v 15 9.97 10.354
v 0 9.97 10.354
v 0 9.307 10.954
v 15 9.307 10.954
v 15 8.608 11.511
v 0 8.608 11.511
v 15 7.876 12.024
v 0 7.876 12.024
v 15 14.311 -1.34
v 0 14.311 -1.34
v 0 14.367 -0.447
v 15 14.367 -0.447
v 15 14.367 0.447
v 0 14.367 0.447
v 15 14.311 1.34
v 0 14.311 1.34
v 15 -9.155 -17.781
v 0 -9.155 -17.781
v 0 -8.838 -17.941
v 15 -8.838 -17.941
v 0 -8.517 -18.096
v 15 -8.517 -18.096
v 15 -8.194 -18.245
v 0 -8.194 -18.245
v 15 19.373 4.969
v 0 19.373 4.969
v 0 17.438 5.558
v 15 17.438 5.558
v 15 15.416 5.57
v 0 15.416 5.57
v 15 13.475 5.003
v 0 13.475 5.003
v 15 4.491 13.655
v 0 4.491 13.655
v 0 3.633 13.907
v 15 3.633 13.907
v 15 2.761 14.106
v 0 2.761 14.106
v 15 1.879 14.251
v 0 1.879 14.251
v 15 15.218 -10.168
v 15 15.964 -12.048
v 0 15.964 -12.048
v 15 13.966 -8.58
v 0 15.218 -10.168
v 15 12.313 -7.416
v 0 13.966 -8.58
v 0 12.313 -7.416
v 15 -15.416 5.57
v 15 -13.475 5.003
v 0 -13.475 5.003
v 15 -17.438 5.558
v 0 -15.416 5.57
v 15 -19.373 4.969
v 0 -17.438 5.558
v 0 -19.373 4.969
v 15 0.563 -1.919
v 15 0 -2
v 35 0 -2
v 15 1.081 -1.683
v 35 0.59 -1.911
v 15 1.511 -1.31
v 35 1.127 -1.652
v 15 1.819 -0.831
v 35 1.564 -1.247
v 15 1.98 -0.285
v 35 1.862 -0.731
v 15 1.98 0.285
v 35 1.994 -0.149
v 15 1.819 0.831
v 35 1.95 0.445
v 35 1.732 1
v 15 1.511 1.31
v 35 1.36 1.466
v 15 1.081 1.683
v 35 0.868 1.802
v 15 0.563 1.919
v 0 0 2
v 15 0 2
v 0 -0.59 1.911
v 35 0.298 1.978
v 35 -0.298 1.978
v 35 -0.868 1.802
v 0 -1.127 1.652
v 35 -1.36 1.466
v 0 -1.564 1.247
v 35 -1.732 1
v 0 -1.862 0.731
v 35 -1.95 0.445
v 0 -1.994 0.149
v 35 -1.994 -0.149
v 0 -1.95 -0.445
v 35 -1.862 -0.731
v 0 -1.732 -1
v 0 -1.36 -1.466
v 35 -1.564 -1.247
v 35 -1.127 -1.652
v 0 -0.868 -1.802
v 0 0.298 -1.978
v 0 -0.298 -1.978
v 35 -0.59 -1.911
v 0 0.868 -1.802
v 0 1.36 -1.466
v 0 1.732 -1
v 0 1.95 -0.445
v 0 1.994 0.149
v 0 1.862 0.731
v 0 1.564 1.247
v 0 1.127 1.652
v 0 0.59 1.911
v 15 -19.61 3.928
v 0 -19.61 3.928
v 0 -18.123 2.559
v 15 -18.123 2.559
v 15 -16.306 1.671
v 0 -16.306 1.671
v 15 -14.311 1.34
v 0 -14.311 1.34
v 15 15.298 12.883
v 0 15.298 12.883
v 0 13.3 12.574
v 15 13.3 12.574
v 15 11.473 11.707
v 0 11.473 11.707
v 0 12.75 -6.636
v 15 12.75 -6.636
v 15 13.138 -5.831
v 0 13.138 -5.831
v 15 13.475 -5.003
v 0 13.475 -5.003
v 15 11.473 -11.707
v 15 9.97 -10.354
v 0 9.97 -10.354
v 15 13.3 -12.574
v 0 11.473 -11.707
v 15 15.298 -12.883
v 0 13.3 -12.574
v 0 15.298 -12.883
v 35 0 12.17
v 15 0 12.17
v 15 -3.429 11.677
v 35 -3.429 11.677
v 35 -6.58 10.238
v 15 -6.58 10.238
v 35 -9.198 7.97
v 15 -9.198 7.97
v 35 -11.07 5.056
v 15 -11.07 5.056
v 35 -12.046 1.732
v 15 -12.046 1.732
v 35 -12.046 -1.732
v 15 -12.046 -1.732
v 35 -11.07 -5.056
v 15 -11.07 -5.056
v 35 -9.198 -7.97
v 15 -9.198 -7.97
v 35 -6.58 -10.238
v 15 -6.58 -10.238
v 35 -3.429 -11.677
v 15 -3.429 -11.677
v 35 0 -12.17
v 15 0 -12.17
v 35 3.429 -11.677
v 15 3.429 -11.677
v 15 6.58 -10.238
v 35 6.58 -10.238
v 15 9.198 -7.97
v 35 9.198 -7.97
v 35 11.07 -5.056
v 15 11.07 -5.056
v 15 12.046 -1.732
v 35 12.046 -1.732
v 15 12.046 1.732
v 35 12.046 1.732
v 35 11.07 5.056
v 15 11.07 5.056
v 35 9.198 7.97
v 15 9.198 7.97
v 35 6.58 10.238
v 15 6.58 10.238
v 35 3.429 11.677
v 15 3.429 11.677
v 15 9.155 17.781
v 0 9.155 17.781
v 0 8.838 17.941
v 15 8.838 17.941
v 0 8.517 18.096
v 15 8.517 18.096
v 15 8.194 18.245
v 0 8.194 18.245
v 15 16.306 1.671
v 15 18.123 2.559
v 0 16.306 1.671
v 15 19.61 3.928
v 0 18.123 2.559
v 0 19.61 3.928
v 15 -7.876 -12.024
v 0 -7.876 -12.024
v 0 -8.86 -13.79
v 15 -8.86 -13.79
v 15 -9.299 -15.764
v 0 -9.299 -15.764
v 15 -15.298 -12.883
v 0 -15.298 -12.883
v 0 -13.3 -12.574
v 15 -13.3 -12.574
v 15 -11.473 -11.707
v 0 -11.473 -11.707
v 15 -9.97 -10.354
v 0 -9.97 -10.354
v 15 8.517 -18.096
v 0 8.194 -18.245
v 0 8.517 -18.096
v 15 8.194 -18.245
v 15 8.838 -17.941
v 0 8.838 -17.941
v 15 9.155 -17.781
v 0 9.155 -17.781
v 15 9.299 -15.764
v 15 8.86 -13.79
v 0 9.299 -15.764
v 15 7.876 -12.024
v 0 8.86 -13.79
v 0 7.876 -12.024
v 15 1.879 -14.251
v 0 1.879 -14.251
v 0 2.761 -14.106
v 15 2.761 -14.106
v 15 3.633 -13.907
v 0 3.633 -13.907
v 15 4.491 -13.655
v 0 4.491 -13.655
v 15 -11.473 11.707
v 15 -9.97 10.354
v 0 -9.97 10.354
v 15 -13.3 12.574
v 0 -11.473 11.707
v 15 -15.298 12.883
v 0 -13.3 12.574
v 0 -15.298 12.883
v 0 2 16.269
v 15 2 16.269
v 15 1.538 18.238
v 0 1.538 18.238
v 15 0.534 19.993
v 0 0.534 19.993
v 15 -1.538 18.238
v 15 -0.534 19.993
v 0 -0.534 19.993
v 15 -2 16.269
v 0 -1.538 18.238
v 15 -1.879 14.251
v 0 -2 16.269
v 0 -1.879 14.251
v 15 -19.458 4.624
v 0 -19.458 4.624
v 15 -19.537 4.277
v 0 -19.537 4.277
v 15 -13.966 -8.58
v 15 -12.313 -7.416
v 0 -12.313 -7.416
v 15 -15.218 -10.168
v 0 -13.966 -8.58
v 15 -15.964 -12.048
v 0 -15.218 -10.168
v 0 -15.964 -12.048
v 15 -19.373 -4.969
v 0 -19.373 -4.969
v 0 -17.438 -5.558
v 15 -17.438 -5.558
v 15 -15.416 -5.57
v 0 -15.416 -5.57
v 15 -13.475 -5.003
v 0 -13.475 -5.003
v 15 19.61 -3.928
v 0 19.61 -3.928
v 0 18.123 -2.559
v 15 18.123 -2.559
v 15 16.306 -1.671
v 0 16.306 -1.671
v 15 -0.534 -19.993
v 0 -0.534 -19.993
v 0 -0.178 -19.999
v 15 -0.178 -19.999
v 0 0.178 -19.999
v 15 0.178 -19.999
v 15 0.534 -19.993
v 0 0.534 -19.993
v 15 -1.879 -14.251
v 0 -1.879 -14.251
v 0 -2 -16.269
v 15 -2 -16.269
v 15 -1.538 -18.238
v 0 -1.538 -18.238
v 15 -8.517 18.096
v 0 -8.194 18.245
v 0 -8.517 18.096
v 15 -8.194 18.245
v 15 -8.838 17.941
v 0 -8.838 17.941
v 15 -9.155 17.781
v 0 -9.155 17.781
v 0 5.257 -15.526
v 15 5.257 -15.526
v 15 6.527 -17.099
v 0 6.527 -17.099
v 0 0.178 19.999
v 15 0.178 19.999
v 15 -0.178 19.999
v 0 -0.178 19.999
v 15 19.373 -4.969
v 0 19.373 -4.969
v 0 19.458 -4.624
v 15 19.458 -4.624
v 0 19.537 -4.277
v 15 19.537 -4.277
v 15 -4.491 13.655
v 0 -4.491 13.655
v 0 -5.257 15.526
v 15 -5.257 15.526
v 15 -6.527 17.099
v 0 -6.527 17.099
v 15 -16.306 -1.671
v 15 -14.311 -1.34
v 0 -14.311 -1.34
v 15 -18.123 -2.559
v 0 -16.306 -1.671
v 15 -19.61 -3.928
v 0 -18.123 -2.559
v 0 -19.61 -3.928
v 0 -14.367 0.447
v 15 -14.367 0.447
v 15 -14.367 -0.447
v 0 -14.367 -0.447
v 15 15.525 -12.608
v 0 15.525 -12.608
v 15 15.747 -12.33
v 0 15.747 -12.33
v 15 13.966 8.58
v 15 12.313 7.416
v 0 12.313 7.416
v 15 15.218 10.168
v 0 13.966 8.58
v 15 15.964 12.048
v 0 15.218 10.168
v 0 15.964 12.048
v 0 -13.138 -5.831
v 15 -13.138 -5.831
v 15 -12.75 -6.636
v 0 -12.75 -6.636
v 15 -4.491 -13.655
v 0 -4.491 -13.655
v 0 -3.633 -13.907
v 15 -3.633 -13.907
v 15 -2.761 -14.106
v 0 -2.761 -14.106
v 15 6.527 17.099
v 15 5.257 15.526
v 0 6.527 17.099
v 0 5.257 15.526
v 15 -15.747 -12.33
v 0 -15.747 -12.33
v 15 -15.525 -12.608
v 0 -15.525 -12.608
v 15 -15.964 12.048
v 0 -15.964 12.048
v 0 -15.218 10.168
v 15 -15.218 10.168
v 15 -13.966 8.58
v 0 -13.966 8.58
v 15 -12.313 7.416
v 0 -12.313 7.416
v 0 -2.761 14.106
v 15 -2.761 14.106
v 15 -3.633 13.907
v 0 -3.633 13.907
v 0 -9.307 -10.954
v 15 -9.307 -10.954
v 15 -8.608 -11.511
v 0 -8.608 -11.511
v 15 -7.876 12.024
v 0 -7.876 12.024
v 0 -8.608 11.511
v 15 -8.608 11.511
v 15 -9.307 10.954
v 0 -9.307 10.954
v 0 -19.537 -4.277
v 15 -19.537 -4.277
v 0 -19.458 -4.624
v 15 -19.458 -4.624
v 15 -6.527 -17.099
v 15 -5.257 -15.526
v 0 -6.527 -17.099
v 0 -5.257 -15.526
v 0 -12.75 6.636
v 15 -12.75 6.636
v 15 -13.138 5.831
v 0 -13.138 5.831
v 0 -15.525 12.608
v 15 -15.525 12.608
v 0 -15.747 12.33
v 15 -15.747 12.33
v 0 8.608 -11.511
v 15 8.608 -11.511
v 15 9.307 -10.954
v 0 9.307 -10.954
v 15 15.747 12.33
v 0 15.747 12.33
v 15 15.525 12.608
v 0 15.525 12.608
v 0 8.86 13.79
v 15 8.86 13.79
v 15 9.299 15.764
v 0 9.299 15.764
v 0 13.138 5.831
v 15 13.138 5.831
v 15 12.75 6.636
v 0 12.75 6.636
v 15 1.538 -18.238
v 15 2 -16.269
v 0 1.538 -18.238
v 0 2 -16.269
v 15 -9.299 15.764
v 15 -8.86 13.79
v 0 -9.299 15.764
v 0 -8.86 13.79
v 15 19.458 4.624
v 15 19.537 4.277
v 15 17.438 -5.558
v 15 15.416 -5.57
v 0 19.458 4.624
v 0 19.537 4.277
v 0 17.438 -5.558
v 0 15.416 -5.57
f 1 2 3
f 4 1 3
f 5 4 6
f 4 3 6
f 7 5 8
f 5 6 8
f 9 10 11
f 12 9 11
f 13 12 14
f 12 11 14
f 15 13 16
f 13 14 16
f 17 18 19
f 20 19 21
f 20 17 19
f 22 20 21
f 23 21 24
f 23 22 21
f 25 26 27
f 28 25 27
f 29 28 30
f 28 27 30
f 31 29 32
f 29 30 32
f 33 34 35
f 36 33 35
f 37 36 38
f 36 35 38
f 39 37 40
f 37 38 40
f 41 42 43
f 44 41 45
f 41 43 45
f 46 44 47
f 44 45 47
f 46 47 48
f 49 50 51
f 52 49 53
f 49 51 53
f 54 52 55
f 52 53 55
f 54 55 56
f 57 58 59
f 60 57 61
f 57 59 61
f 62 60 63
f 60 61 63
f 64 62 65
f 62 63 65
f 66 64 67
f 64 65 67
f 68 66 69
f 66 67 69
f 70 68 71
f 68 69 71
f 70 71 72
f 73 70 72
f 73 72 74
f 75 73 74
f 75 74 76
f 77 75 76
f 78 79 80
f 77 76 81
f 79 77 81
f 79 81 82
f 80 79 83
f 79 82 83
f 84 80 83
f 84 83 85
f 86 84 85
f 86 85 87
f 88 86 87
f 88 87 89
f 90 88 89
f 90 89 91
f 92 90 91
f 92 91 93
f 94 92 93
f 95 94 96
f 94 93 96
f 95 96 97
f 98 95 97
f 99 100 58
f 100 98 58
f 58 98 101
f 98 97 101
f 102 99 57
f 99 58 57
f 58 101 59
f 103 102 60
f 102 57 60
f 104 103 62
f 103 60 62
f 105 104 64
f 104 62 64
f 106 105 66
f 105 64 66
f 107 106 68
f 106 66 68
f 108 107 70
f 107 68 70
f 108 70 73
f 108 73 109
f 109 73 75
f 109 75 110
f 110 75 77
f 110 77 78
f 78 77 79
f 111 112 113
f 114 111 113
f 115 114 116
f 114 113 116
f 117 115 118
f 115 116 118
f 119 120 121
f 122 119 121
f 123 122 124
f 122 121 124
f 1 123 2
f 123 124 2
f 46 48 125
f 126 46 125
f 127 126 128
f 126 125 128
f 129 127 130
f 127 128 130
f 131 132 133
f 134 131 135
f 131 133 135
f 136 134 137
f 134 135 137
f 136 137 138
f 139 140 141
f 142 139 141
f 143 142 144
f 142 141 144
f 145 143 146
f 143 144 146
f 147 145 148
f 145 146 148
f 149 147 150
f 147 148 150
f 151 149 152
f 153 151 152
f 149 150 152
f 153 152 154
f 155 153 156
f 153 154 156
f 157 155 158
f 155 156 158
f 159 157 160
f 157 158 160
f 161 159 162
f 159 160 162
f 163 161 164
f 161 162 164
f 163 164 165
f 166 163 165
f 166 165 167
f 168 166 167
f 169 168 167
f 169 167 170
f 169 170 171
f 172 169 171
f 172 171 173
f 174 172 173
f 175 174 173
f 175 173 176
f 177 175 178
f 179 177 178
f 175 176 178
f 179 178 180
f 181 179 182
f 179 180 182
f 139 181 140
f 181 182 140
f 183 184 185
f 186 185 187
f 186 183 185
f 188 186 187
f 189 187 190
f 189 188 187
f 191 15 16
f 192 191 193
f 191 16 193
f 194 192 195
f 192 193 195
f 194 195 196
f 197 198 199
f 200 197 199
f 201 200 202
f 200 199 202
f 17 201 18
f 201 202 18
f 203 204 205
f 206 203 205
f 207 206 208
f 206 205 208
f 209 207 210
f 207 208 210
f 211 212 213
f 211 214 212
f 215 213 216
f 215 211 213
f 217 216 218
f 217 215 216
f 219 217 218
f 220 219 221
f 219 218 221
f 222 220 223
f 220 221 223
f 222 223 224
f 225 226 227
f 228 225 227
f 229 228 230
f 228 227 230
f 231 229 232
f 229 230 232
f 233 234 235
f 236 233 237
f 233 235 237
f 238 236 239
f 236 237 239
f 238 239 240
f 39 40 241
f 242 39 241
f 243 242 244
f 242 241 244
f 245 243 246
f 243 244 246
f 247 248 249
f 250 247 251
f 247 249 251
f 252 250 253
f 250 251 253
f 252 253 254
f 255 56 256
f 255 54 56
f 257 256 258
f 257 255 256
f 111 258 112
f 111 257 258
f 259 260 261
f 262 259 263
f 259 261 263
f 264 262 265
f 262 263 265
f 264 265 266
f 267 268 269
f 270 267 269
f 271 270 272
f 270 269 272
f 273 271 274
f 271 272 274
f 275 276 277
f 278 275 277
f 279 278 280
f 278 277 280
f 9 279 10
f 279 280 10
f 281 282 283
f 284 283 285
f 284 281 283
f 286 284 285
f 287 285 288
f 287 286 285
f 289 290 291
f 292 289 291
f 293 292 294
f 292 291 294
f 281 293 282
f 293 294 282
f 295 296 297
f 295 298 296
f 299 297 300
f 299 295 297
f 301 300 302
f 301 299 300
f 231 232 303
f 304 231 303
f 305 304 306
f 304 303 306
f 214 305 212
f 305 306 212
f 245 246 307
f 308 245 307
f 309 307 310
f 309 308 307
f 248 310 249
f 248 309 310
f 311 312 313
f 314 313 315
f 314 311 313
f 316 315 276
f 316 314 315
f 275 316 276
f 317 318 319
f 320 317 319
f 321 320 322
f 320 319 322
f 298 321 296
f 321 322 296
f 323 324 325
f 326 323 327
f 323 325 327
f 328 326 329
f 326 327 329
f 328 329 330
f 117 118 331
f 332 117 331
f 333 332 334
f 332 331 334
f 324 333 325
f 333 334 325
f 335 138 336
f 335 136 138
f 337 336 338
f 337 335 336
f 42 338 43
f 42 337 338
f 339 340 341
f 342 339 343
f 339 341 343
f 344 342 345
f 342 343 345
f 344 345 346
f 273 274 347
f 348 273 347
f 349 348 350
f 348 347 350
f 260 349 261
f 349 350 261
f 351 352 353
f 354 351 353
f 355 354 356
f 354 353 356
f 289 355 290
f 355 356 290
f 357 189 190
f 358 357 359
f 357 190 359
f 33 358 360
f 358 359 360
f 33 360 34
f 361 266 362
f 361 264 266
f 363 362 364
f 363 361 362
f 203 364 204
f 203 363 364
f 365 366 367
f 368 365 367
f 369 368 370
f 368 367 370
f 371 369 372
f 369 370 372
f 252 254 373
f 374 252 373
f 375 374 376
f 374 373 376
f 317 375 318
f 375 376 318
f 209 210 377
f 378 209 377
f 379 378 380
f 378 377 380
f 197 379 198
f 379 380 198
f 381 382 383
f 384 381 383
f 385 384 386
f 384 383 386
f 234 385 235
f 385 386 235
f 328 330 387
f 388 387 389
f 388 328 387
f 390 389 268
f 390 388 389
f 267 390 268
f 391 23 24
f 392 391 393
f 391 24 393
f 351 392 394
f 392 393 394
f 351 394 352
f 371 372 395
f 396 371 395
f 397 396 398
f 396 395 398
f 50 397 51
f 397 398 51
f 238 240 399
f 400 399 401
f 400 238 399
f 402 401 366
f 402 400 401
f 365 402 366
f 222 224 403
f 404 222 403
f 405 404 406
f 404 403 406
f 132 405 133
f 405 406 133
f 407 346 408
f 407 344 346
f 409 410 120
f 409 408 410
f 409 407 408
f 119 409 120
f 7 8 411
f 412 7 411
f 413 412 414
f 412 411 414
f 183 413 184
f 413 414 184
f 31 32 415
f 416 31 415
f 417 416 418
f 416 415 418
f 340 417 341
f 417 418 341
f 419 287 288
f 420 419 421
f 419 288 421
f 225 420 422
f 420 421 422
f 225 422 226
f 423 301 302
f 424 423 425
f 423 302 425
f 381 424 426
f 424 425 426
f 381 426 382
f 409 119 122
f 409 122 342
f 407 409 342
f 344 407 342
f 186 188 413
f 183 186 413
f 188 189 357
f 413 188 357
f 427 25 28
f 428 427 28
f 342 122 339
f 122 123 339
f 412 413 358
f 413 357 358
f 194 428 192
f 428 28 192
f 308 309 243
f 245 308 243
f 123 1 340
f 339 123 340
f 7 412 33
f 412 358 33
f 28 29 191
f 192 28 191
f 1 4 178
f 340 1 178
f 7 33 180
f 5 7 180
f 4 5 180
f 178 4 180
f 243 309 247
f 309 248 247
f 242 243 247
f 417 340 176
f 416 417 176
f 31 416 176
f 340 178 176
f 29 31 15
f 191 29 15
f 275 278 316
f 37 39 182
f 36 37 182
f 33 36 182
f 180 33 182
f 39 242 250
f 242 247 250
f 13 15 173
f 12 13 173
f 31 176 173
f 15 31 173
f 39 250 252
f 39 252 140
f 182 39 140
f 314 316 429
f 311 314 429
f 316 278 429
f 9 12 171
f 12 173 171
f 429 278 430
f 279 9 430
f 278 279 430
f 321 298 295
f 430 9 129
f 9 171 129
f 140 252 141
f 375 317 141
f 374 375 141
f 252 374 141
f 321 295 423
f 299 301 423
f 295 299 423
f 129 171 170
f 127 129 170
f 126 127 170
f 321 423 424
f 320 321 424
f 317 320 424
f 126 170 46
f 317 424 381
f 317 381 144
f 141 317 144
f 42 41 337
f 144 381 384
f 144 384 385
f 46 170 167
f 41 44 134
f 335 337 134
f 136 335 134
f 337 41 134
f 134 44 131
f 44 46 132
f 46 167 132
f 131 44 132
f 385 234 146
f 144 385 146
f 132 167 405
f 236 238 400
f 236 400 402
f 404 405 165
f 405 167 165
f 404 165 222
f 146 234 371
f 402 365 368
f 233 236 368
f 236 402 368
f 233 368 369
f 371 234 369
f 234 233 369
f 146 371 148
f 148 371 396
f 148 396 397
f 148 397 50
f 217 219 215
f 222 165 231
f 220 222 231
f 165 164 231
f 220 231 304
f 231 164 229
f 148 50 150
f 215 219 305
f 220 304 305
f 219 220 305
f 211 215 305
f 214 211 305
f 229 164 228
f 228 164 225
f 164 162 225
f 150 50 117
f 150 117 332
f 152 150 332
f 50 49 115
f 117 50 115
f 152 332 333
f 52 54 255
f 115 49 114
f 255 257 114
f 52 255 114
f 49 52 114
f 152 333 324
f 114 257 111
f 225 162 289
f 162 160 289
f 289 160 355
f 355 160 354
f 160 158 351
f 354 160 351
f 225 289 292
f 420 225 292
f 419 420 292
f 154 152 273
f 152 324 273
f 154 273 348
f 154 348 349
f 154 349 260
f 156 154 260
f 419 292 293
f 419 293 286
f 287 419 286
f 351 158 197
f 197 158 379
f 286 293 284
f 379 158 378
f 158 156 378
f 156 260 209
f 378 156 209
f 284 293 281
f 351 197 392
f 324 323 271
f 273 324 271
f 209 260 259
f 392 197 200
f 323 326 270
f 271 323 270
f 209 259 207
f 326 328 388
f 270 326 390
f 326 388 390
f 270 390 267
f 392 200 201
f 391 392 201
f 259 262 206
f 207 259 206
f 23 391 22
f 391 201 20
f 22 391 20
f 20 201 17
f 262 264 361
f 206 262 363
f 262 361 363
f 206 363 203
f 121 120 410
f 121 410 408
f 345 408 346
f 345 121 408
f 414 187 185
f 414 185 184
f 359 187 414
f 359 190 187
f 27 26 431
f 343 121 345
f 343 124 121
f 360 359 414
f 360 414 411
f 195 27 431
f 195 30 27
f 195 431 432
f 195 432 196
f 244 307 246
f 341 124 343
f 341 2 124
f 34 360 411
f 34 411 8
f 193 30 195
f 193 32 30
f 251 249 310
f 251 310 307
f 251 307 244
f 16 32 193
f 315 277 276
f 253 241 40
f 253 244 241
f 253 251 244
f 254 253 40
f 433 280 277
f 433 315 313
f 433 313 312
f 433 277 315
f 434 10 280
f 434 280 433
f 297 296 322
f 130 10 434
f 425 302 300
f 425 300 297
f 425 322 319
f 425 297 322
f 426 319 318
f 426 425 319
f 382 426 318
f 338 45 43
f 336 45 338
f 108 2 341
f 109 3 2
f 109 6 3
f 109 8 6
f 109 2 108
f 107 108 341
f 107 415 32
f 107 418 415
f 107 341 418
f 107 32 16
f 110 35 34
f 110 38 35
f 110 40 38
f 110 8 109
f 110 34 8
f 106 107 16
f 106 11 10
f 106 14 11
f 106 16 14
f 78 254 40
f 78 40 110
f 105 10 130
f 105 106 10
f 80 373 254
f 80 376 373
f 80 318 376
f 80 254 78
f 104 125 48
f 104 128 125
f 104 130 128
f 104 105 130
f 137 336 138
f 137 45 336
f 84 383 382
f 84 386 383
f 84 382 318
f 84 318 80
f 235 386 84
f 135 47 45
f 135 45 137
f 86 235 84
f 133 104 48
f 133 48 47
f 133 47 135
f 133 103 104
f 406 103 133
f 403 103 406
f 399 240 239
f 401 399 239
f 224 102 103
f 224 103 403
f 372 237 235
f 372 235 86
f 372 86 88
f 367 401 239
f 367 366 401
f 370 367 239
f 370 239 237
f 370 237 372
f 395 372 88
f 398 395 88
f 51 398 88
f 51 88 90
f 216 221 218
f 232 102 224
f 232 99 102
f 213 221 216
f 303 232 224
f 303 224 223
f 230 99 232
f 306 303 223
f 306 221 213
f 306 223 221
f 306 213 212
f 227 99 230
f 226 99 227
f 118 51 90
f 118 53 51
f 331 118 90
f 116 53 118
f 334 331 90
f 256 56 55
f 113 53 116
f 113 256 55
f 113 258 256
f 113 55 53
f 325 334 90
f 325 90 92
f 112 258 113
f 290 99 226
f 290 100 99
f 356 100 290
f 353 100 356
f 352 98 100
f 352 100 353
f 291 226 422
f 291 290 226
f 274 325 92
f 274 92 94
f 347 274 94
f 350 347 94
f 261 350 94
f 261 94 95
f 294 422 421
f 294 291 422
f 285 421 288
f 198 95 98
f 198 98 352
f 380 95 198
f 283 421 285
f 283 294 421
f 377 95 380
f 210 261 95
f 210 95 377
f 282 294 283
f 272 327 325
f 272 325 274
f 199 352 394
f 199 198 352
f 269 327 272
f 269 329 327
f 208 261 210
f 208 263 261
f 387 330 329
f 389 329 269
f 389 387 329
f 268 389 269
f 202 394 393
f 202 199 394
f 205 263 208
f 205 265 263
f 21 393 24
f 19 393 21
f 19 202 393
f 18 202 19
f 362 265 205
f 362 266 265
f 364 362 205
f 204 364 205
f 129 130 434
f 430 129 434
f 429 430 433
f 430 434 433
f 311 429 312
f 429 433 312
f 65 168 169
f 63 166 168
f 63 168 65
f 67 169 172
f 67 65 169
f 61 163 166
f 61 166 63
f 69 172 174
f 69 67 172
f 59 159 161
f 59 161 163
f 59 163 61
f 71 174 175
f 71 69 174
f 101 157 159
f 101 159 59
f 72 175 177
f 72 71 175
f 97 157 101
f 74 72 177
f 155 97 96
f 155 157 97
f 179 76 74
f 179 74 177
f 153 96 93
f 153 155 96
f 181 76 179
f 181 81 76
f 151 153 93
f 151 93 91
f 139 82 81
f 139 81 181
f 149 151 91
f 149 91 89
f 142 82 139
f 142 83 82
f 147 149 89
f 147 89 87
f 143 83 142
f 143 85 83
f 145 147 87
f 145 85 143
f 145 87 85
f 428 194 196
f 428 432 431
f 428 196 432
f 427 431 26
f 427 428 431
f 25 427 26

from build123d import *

# Parameters (mm, degrees)
BASPROSKE_W         = 15
BASPROSKE_H         = 20
TOOTHCUT_DEPTH      = 33.015621187
TEETHCUTS_COUNT     = 14
TEETHCUTS_ANGLE     = 334.285714286
BORSKE_R            = 2
BORE_DEPTH          = 50.0000508
SKETCH1_R           = 12.170076636
BOSS_EXTRUDE1_DEPTH = 20
SKETCH3_R           = 2
CUT_EXTRUDE1_DEPTH  = 45.828194428


with BuildPart() as part:
    # BasProSke → Base-Revolve (revolve)
    with BuildSketch(Plane(origin=(0, 0, 0), x_dir=(1, 0, 0), z_dir=(0, 1, 0)), mode=Mode.PRIVATE) as base_revolve_sk:
        with Locations((7.5, 10)):
            Rectangle(BASPROSKE_W, BASPROSKE_H)
    revolve(base_revolve_sk.sketch.rotate(Axis((-10, 0, 0), (1, 0, 0)), 180), axis=Axis((-10, 0, 0), (1, 0, 0)))

    # TooCutSke → ToothCut (cut, through all)
    with BuildSketch(Plane(origin=(0, 0, 0), x_dir=(0, 0, -1), z_dir=(1, 0, 0))):
        with BuildLine():
            ThreePointArc((1.339503949, 14.311450142), (0, 14.374), (-1.339503949, 14.311450142))
            ThreePointArc((-1.339503949, 14.311450142), (-2.055976555, 17.261705303), (-3.954182827, 19.631125371))
            ThreePointArc((-3.954182827, 19.631125371), (0, 20.0254), (3.954182827, 19.631125371))
            ThreePointArc((3.954182827, 19.631125371), (2.055976555, 17.261705303), (1.339503949, 14.311450142))
        make_face()
    toothcut = extrude(amount=TOOTHCUT_DEPTH, mode=Mode.SUBTRACT)

    # TeethCuts: ToothCut ×14 about axis
    teethcuts_axis = Axis((-10, 0, 0), (1, 0, 0))
    for i in range(1, TEETHCUTS_COUNT):
        add(toothcut.rotate(teethcuts_axis, i * TEETHCUTS_ANGLE / (TEETHCUTS_COUNT - 1)), mode=Mode.SUBTRACT)

    # BorSke → Bore (cut, symmetric)
    with BuildSketch(Plane(origin=(0, 0, 0), x_dir=(0, 0, -1), z_dir=(1, 0, 0))):
        with Locations(Location((0, 0, 0), (0, 0, 180))):
            Circle(BORSKE_R)
    extrude(amount=BORE_DEPTH, both=True, mode=Mode.SUBTRACT)

    # Sketch1 → Boss-Extrude1 (add)
    with BuildSketch(Plane(origin=(15, 0, 0), x_dir=(0, 0, -1), z_dir=(1, 0, 0))):
        with Locations(Location((0, 0, 0), (0, 0, 180))):
            Circle(SKETCH1_R)
    extrude(amount=BOSS_EXTRUDE1_DEPTH)

    # Sketch3 → Cut-Extrude1 (cut, through all)
    with BuildSketch(Plane(origin=(35, 0, 0), x_dir=(0, 0, -1), z_dir=(1, 0, 0))):
        Circle(SKETCH3_R)
    extrude(amount=-CUT_EXTRUDE1_DEPTH, mode=Mode.SUBTRACT)


solid = part.part
